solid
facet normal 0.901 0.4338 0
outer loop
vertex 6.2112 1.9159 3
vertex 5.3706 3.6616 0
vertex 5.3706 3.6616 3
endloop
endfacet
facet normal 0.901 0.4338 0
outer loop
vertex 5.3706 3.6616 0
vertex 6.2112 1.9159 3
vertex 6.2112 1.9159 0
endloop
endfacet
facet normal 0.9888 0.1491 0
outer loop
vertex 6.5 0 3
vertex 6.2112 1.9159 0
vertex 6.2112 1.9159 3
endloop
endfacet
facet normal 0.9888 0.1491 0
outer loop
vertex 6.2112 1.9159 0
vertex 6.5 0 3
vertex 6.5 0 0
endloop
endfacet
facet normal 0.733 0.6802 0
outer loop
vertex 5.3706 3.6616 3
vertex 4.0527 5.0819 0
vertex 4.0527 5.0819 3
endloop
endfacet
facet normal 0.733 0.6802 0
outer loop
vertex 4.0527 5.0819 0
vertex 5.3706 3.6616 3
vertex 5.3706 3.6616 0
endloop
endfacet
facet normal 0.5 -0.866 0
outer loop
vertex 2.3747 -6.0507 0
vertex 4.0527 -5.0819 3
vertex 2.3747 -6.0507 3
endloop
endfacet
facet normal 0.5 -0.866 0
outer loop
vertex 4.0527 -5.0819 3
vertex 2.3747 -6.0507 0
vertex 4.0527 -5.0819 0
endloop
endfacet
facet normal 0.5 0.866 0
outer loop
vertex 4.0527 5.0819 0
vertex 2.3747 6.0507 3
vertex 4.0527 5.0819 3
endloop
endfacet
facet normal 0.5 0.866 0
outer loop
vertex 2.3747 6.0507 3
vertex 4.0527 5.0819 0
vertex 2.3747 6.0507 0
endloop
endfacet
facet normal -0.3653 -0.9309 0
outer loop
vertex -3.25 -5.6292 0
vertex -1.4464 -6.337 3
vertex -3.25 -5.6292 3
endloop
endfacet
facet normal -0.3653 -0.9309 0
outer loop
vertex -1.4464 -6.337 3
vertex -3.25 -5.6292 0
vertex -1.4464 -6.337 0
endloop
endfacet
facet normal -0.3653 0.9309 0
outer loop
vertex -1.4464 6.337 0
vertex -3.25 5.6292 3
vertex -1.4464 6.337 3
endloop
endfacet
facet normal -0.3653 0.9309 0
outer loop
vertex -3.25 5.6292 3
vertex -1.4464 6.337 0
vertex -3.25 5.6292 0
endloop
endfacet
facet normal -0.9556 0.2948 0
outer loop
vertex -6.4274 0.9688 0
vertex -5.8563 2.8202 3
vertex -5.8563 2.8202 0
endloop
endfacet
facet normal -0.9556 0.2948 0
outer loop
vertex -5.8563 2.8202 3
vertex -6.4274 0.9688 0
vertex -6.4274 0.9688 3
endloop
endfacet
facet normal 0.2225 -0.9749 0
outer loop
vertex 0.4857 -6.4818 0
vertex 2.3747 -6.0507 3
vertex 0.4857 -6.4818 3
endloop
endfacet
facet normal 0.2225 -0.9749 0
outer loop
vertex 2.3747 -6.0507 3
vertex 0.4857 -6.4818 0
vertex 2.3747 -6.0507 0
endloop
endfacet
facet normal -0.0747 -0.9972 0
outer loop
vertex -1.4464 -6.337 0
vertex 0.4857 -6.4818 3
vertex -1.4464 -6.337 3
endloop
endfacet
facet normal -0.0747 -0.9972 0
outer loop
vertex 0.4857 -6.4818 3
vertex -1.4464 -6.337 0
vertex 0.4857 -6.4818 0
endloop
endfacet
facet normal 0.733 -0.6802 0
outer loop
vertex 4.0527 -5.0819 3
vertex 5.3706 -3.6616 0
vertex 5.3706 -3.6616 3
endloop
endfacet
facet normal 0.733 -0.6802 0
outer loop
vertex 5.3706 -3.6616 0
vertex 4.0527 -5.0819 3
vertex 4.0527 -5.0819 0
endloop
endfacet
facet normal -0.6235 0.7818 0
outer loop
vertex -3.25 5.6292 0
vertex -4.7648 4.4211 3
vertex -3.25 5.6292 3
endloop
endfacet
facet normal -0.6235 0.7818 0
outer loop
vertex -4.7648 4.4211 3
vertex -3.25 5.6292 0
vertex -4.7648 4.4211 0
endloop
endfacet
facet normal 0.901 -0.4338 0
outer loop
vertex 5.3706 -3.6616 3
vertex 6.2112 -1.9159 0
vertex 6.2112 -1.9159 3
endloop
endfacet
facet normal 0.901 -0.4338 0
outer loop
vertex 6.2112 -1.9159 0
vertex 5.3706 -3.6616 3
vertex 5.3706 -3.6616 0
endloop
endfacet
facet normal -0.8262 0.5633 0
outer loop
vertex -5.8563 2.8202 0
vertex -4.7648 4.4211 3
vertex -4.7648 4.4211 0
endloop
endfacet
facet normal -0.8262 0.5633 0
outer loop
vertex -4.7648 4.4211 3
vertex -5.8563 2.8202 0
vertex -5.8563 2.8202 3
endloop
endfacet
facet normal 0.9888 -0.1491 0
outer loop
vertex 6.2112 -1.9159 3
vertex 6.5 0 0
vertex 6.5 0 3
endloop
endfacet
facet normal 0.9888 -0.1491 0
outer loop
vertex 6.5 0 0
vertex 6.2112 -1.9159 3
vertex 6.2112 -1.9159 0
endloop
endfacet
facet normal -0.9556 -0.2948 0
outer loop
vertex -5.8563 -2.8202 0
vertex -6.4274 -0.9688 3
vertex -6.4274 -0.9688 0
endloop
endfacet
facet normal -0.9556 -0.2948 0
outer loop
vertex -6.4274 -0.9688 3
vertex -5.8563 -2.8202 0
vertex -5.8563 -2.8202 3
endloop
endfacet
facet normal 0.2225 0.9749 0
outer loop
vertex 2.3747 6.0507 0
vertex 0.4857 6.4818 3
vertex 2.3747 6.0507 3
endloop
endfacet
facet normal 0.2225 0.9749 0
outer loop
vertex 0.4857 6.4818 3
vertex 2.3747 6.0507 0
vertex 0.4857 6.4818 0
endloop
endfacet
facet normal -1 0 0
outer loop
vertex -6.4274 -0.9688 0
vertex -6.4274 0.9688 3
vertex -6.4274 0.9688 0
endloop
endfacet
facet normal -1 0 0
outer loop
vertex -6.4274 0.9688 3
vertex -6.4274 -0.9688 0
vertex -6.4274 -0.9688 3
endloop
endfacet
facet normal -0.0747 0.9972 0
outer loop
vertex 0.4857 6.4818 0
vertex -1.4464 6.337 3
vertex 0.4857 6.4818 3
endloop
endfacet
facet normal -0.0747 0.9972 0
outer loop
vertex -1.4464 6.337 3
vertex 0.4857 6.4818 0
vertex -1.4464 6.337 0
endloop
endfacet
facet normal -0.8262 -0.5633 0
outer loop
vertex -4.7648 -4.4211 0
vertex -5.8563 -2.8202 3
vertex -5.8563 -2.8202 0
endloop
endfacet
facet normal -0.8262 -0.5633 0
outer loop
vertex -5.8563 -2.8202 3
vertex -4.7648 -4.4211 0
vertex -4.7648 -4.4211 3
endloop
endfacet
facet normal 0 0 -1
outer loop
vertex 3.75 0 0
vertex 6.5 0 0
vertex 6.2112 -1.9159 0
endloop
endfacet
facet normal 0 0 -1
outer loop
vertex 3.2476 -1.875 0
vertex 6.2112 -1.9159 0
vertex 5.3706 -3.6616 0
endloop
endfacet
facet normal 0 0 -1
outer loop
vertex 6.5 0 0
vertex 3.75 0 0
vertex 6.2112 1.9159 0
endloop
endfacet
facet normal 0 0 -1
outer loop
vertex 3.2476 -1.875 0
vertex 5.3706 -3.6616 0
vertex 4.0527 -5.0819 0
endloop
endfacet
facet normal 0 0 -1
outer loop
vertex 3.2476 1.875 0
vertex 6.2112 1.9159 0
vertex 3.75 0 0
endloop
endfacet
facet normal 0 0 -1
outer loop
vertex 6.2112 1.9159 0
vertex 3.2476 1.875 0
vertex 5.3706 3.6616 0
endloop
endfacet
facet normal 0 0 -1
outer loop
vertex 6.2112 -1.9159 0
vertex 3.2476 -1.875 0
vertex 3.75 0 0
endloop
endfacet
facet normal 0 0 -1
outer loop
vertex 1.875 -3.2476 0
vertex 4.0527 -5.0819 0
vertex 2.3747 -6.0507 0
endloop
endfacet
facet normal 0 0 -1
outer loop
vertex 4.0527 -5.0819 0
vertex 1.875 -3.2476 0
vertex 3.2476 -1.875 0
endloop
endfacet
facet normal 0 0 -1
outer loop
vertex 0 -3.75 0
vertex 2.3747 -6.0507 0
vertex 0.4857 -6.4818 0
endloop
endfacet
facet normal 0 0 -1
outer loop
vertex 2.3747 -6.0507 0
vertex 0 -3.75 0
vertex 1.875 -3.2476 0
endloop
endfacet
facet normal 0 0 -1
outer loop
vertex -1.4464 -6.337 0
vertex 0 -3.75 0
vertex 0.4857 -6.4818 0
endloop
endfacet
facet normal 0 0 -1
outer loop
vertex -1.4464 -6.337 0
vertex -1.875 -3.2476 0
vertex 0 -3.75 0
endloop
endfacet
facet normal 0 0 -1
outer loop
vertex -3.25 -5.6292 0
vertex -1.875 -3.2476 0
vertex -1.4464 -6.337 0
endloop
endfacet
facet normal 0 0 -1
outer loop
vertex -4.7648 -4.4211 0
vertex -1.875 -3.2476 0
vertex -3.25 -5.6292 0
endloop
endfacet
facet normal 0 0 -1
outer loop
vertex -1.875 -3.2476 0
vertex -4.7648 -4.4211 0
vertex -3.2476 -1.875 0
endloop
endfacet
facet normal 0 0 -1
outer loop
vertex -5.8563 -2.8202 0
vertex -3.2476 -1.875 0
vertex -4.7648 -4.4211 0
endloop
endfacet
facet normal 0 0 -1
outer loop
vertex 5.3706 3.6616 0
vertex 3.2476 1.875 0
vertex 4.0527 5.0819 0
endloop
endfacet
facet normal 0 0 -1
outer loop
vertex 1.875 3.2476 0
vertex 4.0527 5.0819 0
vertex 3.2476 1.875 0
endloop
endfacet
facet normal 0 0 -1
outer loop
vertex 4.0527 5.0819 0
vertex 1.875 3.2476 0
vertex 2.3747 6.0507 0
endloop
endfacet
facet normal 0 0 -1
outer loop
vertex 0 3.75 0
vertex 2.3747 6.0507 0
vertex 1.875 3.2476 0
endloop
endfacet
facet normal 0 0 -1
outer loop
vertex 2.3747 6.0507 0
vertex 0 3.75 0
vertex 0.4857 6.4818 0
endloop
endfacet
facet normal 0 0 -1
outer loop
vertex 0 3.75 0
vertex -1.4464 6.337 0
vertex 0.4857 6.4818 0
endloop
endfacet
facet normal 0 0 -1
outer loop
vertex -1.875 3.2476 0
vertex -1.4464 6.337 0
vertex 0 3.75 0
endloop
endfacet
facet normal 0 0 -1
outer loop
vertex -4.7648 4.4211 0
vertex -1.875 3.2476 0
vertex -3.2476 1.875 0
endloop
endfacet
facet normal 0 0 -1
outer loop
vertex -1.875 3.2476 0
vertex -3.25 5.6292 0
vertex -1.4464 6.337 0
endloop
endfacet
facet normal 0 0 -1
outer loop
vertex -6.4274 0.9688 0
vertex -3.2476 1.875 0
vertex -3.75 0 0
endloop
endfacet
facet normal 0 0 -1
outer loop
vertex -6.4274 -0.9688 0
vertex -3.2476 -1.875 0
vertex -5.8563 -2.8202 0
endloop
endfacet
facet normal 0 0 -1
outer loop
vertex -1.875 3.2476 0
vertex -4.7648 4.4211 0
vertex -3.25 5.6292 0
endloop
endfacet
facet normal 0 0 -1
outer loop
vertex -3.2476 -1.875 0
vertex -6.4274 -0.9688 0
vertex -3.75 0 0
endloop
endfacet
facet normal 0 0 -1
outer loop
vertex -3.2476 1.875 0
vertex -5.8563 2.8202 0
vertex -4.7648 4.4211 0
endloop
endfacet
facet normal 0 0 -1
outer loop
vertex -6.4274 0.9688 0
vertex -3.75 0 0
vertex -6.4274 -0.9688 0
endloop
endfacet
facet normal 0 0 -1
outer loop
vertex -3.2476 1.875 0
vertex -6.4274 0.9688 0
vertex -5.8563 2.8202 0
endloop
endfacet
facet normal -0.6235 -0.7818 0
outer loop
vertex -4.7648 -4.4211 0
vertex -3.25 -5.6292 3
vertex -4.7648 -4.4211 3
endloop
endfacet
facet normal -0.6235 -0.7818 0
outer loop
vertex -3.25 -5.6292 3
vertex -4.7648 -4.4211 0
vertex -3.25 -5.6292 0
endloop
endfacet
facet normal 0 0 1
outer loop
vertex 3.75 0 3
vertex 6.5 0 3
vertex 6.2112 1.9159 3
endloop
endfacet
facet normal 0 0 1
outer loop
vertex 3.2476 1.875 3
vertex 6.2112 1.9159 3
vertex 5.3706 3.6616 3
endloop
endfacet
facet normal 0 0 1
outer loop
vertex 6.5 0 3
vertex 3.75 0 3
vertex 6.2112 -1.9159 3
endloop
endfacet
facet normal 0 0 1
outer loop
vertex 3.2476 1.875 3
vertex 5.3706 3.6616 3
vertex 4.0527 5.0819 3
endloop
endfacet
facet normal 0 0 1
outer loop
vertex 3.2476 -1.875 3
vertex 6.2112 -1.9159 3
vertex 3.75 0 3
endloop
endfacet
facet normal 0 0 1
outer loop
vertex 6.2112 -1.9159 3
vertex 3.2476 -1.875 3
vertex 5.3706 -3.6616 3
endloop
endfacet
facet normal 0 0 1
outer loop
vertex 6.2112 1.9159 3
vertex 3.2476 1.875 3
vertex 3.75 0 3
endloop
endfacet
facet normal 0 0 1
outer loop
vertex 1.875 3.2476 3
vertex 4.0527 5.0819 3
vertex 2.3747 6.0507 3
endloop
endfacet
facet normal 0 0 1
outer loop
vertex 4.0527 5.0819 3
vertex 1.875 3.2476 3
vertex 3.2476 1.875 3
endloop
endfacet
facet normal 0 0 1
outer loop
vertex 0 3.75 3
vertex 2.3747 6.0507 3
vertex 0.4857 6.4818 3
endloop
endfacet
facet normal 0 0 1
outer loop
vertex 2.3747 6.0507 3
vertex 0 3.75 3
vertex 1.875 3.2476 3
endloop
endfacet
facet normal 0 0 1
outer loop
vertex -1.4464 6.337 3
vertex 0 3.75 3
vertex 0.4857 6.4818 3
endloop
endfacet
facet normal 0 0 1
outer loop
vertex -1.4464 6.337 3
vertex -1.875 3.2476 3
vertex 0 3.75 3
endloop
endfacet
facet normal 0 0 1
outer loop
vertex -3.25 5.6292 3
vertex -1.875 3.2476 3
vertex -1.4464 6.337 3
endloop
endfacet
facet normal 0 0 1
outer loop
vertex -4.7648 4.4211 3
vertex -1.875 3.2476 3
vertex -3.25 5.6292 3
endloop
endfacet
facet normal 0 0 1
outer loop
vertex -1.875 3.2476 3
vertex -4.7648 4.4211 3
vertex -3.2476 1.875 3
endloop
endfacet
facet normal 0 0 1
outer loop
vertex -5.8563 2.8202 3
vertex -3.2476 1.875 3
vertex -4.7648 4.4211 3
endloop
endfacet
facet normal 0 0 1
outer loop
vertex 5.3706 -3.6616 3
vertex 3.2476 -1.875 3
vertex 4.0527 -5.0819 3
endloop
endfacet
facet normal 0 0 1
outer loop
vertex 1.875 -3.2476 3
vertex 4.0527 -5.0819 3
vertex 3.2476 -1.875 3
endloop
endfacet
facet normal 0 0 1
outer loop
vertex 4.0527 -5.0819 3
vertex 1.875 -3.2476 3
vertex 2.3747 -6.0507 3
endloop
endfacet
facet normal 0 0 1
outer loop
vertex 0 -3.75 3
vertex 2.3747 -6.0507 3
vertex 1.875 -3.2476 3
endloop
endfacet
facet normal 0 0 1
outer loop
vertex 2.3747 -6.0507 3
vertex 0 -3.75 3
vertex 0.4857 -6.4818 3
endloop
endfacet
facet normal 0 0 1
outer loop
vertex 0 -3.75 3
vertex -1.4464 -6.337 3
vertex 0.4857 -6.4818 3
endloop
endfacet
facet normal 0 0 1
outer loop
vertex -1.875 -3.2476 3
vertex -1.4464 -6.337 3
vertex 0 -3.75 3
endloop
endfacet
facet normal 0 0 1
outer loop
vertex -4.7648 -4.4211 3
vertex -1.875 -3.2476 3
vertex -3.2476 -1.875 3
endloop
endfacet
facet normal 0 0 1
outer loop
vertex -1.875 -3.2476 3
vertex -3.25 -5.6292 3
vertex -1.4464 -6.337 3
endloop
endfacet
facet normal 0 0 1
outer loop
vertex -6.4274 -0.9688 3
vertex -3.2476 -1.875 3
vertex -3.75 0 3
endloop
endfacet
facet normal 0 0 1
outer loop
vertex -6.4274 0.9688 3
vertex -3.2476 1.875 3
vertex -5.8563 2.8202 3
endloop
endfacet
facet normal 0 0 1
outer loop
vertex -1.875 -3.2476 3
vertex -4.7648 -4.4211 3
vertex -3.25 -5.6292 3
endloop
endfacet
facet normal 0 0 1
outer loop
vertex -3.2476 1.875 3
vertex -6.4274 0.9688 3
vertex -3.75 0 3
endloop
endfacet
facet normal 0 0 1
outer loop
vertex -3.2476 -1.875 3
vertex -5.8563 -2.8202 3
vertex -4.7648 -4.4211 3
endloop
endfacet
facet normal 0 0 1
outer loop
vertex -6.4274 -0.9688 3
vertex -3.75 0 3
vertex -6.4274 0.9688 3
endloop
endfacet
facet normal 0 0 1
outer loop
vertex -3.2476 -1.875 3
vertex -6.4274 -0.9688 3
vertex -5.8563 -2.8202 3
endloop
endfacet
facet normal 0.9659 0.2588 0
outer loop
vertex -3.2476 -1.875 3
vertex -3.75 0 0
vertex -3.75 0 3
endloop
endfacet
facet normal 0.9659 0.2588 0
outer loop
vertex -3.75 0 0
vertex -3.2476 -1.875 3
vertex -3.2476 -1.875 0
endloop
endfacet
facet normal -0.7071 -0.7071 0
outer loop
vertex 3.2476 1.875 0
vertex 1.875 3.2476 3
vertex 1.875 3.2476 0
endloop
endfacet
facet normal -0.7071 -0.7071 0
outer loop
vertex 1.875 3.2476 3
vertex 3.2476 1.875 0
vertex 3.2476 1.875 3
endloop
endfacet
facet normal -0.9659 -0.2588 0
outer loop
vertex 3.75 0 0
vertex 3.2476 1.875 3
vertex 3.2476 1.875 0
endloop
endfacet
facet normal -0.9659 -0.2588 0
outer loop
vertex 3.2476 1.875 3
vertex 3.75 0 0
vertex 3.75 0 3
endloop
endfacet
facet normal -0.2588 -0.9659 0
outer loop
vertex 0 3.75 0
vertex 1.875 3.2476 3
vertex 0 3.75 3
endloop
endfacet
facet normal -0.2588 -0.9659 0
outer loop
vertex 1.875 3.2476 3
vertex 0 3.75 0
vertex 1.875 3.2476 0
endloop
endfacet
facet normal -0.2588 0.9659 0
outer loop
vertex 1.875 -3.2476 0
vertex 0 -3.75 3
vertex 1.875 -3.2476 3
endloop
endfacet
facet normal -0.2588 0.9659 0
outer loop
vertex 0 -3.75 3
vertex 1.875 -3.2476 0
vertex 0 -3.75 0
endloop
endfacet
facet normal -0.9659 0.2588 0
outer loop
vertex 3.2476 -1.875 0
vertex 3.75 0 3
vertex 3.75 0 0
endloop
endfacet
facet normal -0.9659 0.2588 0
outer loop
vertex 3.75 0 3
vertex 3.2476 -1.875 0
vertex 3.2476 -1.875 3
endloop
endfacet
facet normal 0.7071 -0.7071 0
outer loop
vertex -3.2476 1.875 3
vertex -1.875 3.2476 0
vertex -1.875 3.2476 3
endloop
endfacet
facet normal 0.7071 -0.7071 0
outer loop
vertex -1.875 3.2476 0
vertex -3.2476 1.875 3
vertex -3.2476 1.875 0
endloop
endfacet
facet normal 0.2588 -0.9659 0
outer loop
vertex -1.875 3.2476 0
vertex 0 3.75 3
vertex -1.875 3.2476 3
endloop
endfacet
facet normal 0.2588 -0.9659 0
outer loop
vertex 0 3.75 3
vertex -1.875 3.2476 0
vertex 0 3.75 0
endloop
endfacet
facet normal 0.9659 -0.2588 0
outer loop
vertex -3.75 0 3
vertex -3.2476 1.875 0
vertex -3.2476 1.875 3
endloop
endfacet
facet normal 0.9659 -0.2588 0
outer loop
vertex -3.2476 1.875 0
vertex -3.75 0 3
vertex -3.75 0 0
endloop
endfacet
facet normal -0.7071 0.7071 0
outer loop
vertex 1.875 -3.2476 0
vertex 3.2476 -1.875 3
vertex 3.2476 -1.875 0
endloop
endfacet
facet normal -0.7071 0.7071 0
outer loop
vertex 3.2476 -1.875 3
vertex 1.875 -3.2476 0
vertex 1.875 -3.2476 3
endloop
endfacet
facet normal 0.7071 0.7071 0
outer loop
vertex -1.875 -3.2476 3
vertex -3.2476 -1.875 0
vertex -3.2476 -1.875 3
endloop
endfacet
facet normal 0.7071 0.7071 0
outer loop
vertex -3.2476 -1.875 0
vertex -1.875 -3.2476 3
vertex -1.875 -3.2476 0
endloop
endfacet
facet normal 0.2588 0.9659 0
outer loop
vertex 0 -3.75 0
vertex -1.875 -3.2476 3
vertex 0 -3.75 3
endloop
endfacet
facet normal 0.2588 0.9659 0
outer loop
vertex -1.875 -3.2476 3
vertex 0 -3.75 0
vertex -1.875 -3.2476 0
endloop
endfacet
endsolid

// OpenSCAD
module filler(){
    re = 6.5;
    ri = 3.75;
    h = 3;
    
    difference(){
        cylinder(r = re, h = h);
        cylinder(r = ri, h = h);
    }
}

//$fn = 250;
filler();
